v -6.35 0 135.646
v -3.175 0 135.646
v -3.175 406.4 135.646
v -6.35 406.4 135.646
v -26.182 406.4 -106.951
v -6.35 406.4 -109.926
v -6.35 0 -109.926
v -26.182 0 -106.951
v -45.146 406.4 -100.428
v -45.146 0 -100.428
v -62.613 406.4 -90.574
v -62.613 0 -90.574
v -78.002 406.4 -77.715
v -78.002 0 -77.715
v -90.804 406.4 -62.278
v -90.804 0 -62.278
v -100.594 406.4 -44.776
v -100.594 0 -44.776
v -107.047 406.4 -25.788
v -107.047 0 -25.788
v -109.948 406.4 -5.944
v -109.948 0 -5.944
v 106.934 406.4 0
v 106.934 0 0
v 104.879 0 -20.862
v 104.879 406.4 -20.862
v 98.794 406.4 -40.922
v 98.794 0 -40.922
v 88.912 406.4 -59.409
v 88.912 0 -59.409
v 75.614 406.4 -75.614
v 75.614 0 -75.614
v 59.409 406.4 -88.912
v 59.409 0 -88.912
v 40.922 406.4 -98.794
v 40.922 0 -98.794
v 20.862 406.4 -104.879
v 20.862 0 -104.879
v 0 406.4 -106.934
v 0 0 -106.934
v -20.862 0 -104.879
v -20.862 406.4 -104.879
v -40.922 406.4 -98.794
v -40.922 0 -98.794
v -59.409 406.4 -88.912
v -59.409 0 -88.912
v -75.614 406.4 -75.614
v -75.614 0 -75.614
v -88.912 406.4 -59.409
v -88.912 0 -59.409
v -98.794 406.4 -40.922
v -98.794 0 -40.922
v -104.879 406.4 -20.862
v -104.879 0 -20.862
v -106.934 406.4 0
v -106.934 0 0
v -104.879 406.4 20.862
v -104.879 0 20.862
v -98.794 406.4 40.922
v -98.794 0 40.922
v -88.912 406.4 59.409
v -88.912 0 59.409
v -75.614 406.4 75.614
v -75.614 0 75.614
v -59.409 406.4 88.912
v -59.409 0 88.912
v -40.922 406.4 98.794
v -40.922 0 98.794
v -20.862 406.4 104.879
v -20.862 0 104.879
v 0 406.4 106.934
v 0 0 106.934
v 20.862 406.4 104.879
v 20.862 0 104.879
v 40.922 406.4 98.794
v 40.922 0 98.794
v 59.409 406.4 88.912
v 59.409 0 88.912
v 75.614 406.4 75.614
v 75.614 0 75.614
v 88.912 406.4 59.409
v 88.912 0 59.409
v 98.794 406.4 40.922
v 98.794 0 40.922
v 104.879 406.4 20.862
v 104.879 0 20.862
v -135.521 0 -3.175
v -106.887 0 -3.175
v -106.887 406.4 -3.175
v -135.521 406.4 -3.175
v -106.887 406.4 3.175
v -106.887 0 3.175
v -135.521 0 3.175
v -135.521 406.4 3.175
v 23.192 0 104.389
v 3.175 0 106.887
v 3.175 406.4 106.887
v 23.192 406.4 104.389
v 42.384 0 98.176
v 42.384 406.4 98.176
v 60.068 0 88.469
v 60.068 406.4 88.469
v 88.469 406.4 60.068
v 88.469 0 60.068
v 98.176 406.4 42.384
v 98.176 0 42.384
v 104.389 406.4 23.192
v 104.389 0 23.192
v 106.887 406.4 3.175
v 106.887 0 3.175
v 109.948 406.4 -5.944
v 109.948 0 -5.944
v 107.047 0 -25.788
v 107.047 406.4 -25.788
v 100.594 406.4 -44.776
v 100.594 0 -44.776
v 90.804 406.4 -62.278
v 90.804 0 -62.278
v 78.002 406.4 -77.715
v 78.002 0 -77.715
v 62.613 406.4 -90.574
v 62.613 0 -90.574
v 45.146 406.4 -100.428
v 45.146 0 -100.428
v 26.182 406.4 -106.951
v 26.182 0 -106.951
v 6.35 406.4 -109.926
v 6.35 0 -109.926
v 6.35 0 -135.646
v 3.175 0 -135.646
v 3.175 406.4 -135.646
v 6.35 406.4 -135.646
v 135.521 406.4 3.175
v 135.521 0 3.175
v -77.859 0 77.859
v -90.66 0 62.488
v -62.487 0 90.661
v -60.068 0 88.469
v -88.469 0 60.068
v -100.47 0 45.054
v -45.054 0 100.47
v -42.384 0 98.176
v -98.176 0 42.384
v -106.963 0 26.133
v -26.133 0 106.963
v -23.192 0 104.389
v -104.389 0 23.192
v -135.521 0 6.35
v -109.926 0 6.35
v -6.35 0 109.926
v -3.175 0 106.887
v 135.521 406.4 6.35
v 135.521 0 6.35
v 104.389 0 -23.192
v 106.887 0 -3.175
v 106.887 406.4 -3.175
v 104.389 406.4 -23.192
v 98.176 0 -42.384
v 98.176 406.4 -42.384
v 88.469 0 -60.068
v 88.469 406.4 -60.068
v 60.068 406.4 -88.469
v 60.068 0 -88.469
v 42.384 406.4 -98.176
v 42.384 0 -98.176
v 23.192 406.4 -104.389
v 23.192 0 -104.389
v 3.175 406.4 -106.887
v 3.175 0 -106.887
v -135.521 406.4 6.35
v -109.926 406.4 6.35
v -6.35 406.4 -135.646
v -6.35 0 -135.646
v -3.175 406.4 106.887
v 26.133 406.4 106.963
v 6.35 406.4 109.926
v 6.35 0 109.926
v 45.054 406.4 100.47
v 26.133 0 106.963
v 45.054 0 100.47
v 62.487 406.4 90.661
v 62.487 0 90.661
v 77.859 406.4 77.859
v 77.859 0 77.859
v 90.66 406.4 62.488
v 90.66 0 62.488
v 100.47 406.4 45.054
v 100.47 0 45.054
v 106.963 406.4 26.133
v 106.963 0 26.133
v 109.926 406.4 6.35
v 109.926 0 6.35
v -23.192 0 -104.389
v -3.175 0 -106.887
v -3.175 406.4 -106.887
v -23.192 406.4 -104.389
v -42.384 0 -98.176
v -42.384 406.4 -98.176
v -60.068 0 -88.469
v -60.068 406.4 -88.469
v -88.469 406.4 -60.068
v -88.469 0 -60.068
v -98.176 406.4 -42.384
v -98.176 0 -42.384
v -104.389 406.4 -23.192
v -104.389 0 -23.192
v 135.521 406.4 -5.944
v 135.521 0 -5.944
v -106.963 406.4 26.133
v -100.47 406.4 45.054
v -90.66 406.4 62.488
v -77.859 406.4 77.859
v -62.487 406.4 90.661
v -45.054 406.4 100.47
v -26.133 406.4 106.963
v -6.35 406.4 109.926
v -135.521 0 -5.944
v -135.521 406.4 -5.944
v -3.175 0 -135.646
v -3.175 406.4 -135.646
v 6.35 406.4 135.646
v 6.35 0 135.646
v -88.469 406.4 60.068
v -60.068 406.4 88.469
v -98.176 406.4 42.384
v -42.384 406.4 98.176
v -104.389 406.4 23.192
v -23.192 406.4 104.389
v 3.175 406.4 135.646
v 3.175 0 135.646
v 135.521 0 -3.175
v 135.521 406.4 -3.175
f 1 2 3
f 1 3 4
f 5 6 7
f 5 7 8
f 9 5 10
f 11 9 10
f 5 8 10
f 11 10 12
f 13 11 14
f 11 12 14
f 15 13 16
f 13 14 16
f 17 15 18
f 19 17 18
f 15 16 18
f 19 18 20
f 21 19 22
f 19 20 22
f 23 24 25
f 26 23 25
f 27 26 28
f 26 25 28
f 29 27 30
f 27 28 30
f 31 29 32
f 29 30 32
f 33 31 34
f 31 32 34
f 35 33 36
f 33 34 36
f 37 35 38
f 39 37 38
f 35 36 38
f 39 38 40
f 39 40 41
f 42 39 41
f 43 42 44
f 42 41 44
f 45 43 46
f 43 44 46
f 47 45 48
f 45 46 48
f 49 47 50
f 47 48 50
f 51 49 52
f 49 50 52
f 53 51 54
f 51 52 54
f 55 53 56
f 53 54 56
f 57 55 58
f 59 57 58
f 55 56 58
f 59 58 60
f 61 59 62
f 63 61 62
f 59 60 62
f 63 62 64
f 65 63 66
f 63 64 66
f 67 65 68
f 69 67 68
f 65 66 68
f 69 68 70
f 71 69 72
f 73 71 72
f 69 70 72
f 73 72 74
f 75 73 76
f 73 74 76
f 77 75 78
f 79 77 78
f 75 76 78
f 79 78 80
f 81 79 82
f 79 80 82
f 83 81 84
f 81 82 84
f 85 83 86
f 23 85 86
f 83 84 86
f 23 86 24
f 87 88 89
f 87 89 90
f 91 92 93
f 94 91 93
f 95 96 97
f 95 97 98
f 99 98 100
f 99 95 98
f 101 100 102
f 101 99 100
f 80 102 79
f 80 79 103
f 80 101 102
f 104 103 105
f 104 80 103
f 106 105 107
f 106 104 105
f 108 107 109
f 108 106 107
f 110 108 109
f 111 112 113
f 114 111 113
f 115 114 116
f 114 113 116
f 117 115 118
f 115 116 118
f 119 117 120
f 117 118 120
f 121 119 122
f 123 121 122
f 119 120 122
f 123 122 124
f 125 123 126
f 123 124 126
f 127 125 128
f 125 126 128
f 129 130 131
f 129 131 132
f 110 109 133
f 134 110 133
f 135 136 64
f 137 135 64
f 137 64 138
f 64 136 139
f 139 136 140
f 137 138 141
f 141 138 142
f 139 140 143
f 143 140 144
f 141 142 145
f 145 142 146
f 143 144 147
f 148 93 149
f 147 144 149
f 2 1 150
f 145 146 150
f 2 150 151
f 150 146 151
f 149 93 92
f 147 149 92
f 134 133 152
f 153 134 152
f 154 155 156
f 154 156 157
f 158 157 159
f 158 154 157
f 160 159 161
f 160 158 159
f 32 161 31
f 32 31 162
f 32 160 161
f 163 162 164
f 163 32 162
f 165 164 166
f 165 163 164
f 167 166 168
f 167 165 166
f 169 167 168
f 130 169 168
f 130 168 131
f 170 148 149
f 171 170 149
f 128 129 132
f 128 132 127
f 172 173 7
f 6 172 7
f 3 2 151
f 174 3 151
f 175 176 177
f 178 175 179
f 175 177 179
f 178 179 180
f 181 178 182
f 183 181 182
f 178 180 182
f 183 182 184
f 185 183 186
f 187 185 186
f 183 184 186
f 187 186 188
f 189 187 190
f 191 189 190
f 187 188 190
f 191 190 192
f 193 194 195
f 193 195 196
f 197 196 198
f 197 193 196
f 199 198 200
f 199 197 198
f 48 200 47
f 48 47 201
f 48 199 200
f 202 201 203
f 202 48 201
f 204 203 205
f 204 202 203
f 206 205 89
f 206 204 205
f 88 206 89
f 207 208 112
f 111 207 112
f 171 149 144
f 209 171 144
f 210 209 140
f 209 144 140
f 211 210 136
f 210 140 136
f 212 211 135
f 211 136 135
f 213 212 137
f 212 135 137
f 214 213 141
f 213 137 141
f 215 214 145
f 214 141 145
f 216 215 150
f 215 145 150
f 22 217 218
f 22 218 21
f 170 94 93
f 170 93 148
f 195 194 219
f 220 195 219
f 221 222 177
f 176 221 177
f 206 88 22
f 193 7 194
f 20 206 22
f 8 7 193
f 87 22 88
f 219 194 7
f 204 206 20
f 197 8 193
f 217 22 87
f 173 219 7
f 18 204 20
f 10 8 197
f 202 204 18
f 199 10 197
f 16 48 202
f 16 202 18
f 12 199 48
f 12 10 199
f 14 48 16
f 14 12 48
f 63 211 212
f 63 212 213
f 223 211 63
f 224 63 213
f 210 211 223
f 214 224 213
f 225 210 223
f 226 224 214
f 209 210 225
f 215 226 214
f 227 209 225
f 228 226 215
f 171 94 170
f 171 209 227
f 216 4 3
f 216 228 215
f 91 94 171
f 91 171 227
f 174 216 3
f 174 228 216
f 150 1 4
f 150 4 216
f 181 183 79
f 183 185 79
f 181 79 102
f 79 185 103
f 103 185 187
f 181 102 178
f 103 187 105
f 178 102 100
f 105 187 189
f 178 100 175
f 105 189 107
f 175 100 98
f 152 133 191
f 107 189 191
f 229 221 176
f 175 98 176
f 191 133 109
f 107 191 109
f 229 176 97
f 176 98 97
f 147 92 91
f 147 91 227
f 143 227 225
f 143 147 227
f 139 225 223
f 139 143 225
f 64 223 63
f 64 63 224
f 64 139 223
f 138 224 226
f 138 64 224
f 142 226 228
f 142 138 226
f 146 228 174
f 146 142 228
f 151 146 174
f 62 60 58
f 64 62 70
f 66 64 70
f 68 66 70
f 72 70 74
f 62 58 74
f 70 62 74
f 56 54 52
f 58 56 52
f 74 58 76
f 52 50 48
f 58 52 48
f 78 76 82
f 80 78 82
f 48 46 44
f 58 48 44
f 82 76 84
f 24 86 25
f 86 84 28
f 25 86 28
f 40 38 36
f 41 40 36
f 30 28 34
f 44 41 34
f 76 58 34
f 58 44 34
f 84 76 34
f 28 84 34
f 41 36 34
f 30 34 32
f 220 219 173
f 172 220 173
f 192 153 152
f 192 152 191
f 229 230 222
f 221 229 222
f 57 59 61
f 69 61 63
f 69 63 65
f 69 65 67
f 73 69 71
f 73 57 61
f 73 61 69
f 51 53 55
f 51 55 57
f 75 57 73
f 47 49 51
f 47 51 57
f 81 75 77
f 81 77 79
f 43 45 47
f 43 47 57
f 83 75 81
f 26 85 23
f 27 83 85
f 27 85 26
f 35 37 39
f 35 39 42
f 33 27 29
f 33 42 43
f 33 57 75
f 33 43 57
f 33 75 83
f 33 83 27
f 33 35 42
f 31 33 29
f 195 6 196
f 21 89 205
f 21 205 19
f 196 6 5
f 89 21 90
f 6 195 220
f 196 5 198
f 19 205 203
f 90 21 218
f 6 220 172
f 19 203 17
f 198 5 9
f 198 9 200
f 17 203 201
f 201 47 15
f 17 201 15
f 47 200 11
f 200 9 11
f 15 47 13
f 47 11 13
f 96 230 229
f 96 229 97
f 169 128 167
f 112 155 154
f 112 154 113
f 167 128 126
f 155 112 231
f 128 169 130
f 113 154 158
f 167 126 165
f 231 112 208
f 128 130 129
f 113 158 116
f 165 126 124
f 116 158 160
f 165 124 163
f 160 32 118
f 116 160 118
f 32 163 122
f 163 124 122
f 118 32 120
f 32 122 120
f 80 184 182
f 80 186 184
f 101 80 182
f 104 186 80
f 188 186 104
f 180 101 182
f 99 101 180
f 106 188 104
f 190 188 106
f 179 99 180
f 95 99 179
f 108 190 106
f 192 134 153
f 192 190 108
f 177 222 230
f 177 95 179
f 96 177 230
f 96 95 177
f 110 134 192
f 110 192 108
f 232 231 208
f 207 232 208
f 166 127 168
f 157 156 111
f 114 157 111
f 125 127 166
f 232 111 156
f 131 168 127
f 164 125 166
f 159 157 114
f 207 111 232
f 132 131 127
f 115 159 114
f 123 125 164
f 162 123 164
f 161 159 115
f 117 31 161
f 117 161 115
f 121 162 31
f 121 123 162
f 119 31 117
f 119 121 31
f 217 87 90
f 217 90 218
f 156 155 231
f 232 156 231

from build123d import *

# Parameters (mm, degrees)
SKETCH1_R           = 106.934
BOSS_EXTRUDE1_DEPTH = 406.4
BOSS_EXTRUDE3_DEPTH = 406.4
SKETCH3_W           = 254
SKETCH3_H           = 6.35
SKETCH3_W_2         = 6.35
SKETCH3_H_2         = 254
CUT_EXTRUDE2_DEPTH  = 407.4
BOSS_EXTRUDE5_DEPTH = 406.4


with BuildPart() as part:
    # Sketch1 → Boss-Extrude1 (new body)
    with BuildSketch(Plane(origin=(0, 0, 0), x_dir=(1, 0, 0), z_dir=(0, 1, 0))):
        Circle(SKETCH1_R)
    extrude(amount=BOSS_EXTRUDE1_DEPTH)


with BuildPart() as body_2:
    # Sketch2 → Boss-Extrude3 (new body)
    with BuildSketch(Plane(origin=(0, 0, 0), x_dir=(1, 0, 0), z_dir=(0, 1, 0))):
        with BuildLine():
            ThreePointArc((110.109, 0), (77.85882057, 77.85882057), (0, 110.109))
            ThreePointArc((0, 110.109), (-77.85882057, 77.85882057), (-110.109, 0))
            ThreePointArc((-110.109, 0), (-77.85882057, -77.85882057), (0, -110.109))
            ThreePointArc((0, -110.109), (77.85882057, -77.85882057), (110.109, 0))
        make_face()
        with BuildLine():
            ThreePointArc((106.934, 0), (75.613756539, 75.613756539), (0, 106.934))
            ThreePointArc((0, 106.934), (-75.613756539, 75.613756539), (-106.934, 0))
            ThreePointArc((-106.934, 0), (-75.613756539, -75.613756539), (0, -106.934))
            ThreePointArc((0, -106.934), (75.613756539, -75.613756539), (106.934, 0))
        make_face(mode=Mode.SUBTRACT)
    extrude(amount=BOSS_EXTRUDE3_DEPTH)

    # Sketch3 → Cut-Extrude2 (cut, through all)
    with BuildSketch(Plane(origin=(0, 0, 0), x_dir=(1, 0, 0), z_dir=(0, 1, 0))):
        Rectangle(SKETCH3_W, SKETCH3_H)
        Rectangle(SKETCH3_W_2, SKETCH3_H_2)
    extrude(amount=CUT_EXTRUDE2_DEPTH, mode=Mode.SUBTRACT)

    # Sketch5 → Boss-Extrude5 (add)
    with BuildSketch(Plane(origin=(0, 0, 0), x_dir=(1, 0, 0), z_dir=(0, 1, 0))):
        Polygon((-110.063214818, 3.175), (-135.520832556, 3.175), (-135.520832556, 5.944129876), (-108.207325928, 5.944129876), align=None)
        Polygon((-110.063214818, -3.175), (-135.520832642, -3.175), (-135.520832642, -6.35), (-108.207325928, -6.35), align=None)
        Polygon((135.520832642, -6.35), (108.207325928, -6.35), (110.063214818, -3.175), (135.520832642, -3.175), align=None)
        Polygon((135.520832556, 5.944129876), (108.207325928, 5.944129876), (110.063214818, 3.175), (135.520832556, 3.175), align=None)
        Polygon((-3.175, 110.063214818), (-3.175, 135.646128135), (-6.349518475, 135.646128135), (-6.349518475, 108.332621421), align=None)
        Polygon((6.349518475, 135.646128135), (6.349518475, 108.332621421), (3.175, 110.063214818), (3.175, 135.646128135), align=None)
        Polygon((3.175, -135.646128135), (6.349518475, -135.646128135), (6.349518475, -108.332621421), (3.175, -110.063214818), align=None)
        Polygon((-6.349518475, -135.646128135), (-6.349518475, -108.332621421), (-3.175, -110.063214818), (-3.175, -135.646128135), align=None)
    extrude(amount=BOSS_EXTRUDE5_DEPTH)


solid = Compound([part.part, body_2.part])
